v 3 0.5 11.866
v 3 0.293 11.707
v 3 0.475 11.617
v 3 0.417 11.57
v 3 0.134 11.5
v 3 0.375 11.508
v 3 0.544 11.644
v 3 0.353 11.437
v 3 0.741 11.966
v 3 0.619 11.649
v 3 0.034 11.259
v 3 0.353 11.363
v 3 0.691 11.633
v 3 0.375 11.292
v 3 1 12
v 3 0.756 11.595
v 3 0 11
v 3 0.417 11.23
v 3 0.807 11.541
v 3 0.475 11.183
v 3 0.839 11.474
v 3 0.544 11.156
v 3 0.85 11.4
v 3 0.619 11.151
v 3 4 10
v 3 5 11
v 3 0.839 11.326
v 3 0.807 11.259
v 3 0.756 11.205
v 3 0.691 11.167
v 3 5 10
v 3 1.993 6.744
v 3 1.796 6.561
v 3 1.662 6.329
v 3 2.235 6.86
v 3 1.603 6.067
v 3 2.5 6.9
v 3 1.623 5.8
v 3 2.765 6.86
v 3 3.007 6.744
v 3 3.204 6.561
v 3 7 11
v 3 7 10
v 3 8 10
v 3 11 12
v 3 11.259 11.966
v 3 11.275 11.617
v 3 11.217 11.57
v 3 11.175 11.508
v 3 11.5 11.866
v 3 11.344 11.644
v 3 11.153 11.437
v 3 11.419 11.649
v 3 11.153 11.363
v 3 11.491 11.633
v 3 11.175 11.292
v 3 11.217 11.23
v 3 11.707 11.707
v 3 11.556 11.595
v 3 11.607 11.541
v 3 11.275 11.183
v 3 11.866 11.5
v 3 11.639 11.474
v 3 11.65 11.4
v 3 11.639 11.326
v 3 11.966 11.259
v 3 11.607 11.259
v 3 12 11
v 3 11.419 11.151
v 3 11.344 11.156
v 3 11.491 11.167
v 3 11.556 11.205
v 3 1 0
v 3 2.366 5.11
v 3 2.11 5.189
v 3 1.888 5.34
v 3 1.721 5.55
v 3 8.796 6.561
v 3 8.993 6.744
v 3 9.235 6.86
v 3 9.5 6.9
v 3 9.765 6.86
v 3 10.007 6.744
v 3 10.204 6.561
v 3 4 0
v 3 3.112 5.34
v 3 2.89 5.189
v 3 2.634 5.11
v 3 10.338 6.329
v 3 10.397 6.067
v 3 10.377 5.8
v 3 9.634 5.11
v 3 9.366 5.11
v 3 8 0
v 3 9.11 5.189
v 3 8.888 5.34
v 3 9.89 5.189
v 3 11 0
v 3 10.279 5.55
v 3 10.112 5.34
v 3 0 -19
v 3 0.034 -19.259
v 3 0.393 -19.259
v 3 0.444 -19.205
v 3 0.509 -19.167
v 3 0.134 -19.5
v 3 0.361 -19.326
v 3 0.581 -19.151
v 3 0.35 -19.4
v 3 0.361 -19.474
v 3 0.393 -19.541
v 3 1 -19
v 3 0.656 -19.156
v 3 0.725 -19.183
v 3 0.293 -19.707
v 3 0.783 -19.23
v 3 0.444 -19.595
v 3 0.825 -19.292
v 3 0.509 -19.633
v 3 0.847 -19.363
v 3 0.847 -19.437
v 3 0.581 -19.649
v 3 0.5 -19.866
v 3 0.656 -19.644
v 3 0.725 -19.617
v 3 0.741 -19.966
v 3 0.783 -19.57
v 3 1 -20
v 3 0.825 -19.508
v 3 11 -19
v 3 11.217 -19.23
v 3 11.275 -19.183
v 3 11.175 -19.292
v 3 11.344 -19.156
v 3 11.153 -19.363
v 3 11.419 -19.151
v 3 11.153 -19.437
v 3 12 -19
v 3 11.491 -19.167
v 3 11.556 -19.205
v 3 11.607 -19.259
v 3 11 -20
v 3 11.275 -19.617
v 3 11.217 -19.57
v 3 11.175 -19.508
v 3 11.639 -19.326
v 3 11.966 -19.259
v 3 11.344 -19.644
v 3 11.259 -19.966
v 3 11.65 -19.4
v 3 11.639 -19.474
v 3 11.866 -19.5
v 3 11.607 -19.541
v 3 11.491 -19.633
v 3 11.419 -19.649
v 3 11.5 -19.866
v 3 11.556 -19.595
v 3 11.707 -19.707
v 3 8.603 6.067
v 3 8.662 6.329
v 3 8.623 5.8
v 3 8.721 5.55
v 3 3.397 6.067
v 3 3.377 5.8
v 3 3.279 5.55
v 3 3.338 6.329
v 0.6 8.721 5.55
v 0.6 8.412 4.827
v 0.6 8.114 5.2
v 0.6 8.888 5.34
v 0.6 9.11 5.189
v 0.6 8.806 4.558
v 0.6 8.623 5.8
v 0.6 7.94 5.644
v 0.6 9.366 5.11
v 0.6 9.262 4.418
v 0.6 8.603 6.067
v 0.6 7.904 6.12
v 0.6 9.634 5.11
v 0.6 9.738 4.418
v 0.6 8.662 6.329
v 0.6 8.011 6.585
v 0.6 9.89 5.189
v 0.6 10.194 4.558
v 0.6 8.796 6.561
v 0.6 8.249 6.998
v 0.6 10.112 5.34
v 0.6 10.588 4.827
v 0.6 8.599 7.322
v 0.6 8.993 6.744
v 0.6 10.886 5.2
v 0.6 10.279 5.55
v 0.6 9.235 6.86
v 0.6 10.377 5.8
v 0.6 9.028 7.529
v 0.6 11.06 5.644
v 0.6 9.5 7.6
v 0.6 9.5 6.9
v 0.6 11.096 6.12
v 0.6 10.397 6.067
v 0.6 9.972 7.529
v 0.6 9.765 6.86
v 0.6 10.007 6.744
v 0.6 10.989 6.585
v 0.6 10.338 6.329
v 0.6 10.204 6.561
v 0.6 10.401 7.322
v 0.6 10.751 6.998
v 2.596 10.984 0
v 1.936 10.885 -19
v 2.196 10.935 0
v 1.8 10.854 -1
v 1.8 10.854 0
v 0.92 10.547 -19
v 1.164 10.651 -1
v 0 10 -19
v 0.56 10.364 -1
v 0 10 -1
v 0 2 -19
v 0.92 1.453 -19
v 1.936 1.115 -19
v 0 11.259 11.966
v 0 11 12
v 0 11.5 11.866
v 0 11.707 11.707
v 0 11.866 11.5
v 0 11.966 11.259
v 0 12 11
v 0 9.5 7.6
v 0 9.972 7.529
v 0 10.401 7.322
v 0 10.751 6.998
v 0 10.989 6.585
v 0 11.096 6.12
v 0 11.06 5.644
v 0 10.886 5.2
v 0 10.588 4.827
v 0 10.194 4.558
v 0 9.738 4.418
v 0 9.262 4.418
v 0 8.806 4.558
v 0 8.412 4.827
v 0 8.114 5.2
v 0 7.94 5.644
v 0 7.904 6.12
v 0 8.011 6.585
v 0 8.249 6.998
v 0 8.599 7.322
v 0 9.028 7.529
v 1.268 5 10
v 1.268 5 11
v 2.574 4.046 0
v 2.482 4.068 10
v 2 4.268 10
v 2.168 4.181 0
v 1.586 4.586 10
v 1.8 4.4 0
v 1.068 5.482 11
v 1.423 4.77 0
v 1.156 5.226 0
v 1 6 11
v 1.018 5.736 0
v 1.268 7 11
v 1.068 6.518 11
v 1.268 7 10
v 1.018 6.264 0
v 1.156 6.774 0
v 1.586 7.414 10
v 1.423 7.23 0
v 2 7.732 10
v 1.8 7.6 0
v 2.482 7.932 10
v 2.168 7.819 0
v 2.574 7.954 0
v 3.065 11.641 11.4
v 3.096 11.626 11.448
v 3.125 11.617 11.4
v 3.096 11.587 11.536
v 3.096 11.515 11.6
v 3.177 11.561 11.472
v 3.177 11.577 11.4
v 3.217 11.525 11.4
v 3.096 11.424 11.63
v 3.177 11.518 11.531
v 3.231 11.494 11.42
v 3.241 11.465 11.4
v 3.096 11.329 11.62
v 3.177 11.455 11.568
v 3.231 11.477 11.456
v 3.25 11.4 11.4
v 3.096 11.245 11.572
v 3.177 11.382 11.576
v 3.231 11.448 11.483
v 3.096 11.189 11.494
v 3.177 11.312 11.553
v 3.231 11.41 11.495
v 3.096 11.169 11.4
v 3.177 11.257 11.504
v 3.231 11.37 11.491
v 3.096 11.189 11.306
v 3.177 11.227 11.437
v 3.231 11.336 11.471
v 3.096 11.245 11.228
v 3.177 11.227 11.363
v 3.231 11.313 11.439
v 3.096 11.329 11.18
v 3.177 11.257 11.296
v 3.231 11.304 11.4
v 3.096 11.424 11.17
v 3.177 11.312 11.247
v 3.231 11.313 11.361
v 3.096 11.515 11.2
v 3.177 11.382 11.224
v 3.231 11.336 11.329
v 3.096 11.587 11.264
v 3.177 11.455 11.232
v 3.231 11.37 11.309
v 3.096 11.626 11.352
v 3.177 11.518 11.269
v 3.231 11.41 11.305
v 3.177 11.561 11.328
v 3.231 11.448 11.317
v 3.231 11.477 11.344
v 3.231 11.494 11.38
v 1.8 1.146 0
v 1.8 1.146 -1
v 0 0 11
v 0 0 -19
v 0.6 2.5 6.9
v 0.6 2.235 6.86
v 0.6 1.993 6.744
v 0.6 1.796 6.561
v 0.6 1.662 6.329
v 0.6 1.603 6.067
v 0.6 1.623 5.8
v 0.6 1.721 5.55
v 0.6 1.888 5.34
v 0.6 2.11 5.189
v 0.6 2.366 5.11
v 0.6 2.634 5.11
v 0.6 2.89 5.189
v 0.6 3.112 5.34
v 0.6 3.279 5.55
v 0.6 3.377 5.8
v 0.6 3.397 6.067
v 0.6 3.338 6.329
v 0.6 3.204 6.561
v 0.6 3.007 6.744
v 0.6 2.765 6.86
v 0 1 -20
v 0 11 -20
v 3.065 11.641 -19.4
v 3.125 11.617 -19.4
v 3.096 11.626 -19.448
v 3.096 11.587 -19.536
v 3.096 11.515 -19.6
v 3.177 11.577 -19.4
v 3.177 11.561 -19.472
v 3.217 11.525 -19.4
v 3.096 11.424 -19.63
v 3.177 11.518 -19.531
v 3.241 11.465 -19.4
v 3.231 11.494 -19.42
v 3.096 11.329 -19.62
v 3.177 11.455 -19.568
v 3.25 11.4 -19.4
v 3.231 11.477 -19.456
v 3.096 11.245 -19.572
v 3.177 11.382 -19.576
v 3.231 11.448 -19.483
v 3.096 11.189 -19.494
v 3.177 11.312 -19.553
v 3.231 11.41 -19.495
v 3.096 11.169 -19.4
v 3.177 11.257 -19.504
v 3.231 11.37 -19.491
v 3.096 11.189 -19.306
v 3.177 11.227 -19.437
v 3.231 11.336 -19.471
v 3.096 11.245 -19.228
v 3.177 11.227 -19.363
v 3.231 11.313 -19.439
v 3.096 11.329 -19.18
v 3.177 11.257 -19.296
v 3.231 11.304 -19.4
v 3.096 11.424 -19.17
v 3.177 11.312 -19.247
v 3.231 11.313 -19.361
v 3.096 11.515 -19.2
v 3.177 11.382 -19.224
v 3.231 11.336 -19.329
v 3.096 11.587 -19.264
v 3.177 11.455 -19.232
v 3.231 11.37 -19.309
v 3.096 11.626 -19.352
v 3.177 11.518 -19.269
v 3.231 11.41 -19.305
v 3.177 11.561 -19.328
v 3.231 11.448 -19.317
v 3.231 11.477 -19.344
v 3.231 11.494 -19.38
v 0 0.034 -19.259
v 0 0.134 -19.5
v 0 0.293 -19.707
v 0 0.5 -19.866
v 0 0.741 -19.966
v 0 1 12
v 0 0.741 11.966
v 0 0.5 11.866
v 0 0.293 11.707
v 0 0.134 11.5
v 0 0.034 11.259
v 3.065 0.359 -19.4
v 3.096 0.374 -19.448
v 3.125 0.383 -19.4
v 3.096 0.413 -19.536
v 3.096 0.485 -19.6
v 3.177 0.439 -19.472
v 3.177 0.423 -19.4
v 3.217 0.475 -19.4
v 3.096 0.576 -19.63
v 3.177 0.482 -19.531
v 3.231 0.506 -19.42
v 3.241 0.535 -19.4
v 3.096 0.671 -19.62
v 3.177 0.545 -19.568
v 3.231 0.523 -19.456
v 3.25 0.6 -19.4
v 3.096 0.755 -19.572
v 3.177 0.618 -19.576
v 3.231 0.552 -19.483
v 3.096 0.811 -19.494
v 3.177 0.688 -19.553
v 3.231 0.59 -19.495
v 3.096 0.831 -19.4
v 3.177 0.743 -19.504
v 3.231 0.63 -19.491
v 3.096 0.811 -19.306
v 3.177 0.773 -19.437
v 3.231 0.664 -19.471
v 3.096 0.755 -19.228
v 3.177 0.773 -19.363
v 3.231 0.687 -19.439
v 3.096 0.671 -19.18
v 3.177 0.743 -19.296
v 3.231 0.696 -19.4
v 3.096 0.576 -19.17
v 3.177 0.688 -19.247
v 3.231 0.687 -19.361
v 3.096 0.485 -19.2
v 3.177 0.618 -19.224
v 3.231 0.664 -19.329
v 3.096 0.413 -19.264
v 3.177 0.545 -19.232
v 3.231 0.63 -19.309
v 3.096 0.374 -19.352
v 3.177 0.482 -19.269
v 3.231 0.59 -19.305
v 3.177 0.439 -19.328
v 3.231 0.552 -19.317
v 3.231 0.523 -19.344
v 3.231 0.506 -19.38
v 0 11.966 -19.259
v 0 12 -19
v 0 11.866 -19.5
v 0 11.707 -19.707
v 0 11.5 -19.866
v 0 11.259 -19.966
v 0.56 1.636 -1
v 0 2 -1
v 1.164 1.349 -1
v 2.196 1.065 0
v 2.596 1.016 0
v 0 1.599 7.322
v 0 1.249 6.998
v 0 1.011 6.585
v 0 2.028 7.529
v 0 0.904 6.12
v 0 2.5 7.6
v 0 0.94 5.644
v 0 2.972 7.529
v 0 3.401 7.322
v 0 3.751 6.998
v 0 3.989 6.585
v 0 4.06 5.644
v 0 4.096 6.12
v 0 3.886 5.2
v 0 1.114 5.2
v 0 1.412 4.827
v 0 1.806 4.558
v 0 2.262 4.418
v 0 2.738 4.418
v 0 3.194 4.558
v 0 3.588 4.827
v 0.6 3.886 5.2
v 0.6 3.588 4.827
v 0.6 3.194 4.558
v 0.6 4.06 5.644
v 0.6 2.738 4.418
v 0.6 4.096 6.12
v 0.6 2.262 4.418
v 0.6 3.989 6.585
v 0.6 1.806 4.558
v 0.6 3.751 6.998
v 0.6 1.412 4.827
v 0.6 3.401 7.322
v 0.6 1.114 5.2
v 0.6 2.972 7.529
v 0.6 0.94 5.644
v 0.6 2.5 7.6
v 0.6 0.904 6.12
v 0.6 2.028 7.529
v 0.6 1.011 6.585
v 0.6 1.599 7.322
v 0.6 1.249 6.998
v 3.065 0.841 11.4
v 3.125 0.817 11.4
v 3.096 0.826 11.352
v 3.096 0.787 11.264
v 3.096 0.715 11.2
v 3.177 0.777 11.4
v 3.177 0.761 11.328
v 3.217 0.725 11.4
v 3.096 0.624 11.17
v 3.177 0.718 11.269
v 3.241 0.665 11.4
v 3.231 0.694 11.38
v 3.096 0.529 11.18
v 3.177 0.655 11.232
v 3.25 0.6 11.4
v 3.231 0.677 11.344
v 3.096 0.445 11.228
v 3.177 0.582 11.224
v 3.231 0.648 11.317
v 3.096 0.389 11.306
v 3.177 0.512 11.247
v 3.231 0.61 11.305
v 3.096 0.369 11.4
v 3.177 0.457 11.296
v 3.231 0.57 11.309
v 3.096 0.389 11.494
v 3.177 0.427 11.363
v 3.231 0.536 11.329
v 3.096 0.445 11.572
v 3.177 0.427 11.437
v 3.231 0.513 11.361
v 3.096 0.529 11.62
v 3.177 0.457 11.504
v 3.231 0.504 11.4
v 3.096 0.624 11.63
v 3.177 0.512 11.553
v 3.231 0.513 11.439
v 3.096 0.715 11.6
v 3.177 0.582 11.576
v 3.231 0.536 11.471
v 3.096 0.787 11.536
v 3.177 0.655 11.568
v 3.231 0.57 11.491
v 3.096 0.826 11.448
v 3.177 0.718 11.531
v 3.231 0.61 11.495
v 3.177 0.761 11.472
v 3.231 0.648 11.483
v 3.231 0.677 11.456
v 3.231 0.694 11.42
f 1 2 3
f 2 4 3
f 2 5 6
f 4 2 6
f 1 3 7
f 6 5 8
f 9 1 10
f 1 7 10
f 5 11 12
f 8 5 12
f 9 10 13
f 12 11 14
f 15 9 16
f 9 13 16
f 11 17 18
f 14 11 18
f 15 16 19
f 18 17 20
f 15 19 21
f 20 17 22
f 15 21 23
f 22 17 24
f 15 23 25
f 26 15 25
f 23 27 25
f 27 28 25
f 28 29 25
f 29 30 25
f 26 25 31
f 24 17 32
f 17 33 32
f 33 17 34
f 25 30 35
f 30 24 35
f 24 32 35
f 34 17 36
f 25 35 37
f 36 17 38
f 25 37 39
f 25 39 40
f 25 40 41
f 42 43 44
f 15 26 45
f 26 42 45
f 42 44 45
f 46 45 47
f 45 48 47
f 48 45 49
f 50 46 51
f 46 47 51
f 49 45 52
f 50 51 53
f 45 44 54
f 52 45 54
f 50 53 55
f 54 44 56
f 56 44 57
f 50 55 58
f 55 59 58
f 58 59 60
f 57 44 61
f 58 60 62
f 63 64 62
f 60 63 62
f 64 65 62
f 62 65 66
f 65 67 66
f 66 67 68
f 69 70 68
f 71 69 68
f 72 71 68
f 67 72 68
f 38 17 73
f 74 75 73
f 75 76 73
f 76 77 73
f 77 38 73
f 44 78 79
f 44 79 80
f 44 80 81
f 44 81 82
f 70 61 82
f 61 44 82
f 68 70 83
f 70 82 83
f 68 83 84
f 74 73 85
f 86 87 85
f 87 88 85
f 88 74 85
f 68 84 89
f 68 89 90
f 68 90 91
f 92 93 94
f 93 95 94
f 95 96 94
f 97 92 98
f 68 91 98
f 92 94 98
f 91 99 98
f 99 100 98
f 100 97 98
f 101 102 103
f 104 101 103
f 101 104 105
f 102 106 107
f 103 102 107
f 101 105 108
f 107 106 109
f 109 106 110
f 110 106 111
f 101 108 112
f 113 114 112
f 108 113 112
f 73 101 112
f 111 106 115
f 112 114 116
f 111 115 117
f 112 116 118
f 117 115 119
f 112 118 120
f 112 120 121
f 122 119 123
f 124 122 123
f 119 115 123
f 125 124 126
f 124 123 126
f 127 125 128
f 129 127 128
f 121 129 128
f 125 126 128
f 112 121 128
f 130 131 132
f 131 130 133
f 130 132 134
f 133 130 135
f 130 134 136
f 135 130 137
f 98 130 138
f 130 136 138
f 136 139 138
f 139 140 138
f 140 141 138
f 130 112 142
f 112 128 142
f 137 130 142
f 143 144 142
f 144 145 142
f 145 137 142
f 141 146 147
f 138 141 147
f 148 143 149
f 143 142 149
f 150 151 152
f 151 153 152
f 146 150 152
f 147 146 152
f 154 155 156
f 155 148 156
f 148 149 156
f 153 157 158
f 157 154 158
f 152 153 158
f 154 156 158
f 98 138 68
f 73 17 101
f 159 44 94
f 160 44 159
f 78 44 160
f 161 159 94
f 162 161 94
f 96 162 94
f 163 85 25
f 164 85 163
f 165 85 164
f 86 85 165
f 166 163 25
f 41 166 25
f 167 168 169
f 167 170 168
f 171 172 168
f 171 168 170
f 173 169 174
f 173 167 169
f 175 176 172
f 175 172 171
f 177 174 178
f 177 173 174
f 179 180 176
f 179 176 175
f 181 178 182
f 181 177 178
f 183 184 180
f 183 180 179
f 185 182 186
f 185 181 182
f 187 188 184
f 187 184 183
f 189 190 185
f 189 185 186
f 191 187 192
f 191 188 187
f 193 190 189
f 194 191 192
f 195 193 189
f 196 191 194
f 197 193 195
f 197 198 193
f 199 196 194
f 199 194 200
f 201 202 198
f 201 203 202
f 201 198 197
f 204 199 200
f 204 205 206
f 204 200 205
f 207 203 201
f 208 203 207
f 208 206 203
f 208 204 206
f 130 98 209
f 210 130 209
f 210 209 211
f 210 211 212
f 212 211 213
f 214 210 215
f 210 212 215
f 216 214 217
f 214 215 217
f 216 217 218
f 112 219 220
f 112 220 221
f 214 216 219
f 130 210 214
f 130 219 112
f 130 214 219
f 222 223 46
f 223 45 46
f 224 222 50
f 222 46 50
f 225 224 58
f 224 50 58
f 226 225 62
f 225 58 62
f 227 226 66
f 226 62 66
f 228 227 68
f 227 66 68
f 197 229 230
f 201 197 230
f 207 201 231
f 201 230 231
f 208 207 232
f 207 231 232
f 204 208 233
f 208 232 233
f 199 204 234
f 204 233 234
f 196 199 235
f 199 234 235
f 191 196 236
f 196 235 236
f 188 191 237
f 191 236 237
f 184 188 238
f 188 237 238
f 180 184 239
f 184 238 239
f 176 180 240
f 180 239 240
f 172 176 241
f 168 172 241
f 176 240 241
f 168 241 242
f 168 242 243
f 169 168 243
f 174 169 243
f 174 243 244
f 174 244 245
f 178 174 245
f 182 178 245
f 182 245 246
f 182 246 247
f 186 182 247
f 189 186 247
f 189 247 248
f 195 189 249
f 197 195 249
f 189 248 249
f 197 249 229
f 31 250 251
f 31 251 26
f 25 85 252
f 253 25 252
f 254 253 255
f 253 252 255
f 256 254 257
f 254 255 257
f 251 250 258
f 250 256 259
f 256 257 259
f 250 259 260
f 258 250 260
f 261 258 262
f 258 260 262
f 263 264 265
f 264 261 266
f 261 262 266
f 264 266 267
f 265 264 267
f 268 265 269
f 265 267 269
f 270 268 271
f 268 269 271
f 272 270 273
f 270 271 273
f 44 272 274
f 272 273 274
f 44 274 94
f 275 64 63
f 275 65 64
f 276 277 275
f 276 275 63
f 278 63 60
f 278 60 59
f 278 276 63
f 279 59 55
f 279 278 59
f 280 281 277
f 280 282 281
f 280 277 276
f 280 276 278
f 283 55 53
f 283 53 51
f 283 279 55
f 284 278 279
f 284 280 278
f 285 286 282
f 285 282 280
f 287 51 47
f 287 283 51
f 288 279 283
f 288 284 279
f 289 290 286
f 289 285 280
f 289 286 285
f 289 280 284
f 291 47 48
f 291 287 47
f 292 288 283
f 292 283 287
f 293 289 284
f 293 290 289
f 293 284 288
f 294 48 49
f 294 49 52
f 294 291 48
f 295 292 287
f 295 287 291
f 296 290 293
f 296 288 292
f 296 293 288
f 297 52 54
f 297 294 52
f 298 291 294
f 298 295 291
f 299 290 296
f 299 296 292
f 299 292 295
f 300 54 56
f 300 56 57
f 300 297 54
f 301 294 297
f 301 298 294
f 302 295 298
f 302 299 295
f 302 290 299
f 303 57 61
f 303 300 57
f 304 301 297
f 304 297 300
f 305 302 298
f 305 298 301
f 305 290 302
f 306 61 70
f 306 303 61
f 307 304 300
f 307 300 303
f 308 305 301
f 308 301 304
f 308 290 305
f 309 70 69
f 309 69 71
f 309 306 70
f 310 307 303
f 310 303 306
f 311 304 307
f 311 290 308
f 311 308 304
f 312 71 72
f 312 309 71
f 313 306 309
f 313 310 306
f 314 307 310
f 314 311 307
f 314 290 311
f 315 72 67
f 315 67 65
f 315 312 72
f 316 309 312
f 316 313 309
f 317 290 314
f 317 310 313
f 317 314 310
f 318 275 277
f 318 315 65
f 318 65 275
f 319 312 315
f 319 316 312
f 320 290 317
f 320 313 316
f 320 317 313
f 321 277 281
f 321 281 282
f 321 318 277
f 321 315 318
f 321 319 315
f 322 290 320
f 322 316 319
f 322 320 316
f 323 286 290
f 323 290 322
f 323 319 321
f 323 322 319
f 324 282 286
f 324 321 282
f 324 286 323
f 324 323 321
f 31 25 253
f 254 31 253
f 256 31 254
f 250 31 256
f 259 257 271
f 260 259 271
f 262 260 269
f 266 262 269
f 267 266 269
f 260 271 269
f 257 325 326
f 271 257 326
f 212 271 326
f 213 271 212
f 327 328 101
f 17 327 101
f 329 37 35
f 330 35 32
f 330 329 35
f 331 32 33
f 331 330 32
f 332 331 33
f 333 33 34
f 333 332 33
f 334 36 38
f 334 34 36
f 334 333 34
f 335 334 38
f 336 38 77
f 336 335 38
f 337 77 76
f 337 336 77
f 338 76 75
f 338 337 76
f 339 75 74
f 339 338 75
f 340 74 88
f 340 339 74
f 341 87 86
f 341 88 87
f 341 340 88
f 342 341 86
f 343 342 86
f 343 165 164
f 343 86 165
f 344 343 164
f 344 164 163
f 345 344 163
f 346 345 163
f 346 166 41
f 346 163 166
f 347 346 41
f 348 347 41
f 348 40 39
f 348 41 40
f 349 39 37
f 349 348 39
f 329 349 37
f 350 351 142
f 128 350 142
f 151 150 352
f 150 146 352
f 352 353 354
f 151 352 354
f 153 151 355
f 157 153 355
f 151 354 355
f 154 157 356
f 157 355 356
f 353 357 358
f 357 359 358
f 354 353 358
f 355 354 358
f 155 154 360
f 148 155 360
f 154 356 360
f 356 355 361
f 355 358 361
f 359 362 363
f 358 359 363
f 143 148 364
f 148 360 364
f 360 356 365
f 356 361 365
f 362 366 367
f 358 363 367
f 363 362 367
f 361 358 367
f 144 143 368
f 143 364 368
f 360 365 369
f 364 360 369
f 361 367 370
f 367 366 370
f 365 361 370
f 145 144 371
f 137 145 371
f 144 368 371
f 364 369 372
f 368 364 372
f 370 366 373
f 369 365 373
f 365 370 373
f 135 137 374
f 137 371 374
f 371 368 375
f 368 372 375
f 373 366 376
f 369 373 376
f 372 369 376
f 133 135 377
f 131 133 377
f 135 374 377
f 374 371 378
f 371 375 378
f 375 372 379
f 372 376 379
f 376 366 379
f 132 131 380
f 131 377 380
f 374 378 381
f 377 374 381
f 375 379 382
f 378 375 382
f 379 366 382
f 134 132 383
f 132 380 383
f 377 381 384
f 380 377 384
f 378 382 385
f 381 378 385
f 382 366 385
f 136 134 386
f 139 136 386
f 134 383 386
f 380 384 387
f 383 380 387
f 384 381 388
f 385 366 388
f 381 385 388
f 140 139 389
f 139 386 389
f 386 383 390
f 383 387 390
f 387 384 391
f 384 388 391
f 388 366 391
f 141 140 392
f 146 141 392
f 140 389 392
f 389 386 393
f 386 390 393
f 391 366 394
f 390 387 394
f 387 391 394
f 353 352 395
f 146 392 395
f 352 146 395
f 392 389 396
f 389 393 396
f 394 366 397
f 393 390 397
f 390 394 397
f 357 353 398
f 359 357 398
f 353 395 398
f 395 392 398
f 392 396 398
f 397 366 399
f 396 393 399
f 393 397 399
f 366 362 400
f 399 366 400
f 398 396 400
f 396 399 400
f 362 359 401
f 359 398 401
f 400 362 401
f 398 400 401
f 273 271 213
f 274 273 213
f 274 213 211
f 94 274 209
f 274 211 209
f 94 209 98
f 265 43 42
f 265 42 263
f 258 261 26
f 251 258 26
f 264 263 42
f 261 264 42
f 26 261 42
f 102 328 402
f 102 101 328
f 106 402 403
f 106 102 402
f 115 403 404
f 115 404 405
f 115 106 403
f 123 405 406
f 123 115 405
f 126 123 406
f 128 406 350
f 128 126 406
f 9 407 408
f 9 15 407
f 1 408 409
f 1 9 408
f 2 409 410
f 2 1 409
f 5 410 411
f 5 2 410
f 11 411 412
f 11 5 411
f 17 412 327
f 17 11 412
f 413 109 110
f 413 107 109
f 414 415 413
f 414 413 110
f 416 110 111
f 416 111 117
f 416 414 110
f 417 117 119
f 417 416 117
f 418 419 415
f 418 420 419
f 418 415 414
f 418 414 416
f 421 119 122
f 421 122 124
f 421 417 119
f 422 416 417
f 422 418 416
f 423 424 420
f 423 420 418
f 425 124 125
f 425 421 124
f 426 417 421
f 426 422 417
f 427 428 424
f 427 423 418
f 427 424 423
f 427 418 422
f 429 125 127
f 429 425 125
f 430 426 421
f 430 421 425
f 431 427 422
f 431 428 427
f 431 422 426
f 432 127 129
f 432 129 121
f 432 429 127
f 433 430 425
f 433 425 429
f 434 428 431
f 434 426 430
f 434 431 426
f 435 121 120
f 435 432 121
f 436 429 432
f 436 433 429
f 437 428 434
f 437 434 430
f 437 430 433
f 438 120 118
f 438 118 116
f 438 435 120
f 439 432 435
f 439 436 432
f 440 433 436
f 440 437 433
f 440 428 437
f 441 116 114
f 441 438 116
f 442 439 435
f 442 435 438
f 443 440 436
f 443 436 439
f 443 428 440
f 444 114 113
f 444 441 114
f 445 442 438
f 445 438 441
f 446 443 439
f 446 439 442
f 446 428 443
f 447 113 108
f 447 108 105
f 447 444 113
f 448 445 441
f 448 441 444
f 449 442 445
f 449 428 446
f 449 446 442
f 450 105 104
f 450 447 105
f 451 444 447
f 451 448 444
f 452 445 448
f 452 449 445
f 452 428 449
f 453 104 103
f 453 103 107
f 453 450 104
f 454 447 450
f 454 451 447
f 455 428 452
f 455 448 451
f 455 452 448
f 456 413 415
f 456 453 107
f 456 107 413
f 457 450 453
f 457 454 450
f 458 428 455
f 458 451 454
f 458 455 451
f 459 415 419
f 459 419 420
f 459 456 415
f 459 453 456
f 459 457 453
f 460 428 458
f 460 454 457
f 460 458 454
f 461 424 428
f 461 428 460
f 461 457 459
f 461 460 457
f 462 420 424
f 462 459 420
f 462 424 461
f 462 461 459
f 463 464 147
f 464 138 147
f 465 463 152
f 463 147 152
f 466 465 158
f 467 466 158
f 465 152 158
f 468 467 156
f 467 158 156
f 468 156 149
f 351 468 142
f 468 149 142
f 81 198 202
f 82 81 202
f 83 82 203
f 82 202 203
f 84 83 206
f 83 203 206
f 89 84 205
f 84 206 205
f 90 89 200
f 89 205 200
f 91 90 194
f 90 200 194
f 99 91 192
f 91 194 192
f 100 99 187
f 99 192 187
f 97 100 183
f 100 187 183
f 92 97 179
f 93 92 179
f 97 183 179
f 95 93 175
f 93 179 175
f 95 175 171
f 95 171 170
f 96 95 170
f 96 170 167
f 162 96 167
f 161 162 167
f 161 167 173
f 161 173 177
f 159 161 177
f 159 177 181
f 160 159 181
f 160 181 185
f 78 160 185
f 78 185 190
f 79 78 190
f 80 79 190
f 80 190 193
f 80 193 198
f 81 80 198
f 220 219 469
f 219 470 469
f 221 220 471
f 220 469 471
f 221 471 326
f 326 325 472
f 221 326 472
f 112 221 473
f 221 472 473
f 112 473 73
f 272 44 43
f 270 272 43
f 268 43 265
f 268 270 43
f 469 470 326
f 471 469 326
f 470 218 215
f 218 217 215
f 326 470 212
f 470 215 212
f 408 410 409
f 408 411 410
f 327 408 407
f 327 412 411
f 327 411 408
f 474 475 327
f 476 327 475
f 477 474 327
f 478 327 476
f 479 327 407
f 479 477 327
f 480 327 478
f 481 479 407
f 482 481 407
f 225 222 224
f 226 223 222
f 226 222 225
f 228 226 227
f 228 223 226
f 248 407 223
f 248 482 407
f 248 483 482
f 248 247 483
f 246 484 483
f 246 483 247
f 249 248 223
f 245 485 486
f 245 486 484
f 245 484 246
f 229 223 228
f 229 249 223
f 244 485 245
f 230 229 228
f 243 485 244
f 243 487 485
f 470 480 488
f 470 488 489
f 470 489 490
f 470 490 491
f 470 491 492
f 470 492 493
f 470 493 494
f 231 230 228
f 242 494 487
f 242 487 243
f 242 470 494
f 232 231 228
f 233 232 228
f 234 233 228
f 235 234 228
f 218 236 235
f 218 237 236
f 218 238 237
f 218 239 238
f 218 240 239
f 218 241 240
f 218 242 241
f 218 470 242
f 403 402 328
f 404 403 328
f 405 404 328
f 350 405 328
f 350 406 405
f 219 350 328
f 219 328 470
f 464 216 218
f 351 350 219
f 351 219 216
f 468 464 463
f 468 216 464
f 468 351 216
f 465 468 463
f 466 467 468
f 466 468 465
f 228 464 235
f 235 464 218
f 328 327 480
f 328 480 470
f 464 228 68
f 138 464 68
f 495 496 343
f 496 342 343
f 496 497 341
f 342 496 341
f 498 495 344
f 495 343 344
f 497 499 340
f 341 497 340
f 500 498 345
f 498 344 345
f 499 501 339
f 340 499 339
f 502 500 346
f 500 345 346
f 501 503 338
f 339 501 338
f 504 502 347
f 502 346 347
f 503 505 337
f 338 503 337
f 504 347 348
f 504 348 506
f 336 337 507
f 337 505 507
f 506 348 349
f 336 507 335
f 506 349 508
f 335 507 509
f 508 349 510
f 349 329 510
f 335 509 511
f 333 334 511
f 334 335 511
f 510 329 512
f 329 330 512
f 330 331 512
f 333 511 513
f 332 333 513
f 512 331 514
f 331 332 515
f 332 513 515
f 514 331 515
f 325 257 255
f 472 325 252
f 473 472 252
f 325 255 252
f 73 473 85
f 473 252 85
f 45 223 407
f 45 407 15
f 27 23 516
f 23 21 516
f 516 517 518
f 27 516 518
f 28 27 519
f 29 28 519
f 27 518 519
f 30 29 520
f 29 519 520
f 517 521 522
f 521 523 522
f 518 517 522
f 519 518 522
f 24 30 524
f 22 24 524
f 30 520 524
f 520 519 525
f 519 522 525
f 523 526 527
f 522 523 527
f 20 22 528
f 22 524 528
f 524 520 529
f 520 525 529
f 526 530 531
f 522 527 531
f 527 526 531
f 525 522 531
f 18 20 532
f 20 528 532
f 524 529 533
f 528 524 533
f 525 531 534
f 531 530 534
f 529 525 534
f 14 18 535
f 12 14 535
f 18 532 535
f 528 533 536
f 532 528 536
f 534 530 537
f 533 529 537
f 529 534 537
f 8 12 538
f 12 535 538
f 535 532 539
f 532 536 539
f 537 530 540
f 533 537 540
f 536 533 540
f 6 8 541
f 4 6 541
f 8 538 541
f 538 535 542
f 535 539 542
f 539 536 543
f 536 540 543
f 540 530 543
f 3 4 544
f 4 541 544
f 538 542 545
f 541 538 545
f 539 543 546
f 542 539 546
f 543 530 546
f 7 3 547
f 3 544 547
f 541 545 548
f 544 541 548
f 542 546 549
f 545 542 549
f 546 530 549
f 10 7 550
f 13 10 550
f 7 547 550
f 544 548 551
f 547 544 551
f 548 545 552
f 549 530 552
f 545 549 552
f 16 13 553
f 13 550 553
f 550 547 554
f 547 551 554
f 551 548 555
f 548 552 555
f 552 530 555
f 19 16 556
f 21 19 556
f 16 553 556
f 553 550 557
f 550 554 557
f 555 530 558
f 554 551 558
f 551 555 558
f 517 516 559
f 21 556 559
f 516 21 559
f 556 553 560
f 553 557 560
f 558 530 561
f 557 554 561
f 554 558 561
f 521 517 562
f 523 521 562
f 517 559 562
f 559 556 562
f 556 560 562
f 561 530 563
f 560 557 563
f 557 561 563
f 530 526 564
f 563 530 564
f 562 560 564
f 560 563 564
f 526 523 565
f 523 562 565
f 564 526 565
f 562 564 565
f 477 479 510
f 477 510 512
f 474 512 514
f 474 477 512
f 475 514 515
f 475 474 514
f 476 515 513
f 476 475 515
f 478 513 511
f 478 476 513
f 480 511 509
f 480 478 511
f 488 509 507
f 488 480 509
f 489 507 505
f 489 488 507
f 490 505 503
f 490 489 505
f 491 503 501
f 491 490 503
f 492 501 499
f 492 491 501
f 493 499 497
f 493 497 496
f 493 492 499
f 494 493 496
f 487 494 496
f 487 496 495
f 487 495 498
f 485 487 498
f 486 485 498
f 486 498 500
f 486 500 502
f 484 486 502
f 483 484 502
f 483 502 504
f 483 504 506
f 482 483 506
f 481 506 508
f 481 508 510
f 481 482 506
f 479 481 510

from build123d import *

# Parameters (mm, degrees)
SKETCH1_W           = 3
SKETCH1_H           = 12
BOSS_EXTRUDE1_DEPTH = 20
SKETCH2_R           = 5
CUT_EXTRUDE1_DEPTH  = 19
SKETCH6_W           = 3
SKETCH6_H           = 12
BOSS_EXTRUDE3_DEPTH = 12
SKETCH13_W          = 1.8
SKETCH13_H          = 12
BOSS_EXTRUDE4_DEPTH = 1
SKETCH7_R           = 2
CUT_EXTRUDE2_DEPTH  = 10
CUT_EXTRUDE3_DEPTH  = 1
SKETCH11_R          = 1.6
CUT_EXTRUDE4_DEPTH  = 0.6
SKETCH12_R          = 0.9
CUT_EXTRUDE5_DEPTH  = 24.446961424
FILLET2_R           = 1


with BuildPart() as part:
    # Sketch1 → Boss-Extrude1 (new body)
    with BuildSketch(Plane.XY):
        with Locations((1.5, 6)):
            Rectangle(SKETCH1_W, SKETCH1_H)
    extrude(amount=-BOSS_EXTRUDE1_DEPTH)

    # Sketch2 → Cut-Extrude1 (cut)
    with BuildSketch(Plane.XY):
        with Locations((3, 6)):
            Circle(SKETCH2_R)
    extrude(amount=-CUT_EXTRUDE1_DEPTH, mode=Mode.SUBTRACT)

    # Sketch6 → Boss-Extrude3 (add)
    with BuildSketch(Plane.XY):
        with Locations((1.5, 6)):
            Rectangle(SKETCH6_W, SKETCH6_H)
    extrude(amount=BOSS_EXTRUDE3_DEPTH)

    # Sketch13 → Boss-Extrude4 (add)
    with BuildSketch(Plane.XY):
        with Locations((0.9, 6)):
            Rectangle(SKETCH13_W, SKETCH13_H)
    extrude(amount=-BOSS_EXTRUDE4_DEPTH)

    # Sketch7 → Cut-Extrude2 (cut)
    with BuildSketch(Plane(origin=(0, 0, 0), x_dir=(-1, 0, 0), z_dir=(0, 0, -1))):
        with Locations((-3, 6)):
            Circle(SKETCH7_R)
    extrude(amount=-CUT_EXTRUDE2_DEPTH, mode=Mode.SUBTRACT)

    # Sketch10 → Cut-Extrude3 (cut)
    with BuildSketch(Plane(origin=(0, 0, 10), x_dir=(-1, 0, 0), z_dir=(0, 0, -1))):
        with BuildLine():
            Line((-3, 7), (-1.267949192, 7))
            ThreePointArc((-1.267949192, 7), (-1, 6), (-1.267949192, 5))
            Line((-1.267949192, 5), (-3, 5))
            Line((-3, 5), (-3, 7))
        make_face()
    extrude(amount=-CUT_EXTRUDE3_DEPTH, mode=Mode.SUBTRACT)

    # Sketch11 → Cut-Extrude4 (cut)
    with BuildSketch(Plane.ZY):
        with Locations((6, 9.5)):
            Circle(SKETCH11_R)
    cut_extrude4 = extrude(amount=-CUT_EXTRUDE4_DEPTH, mode=Mode.SUBTRACT)

    # Sketch12 → Cut-Extrude5 (cut, through all)
    with BuildSketch(Plane.ZY.offset(-0.6)):
        with Locations((6, 9.5)):
            Circle(SKETCH12_R)
    cut_extrude5 = extrude(amount=-CUT_EXTRUDE5_DEPTH, mode=Mode.SUBTRACT)

    # Mirror1: Cut-Extrude4, Cut-Extrude5 across plane
    add(cut_extrude4.mirror(Plane(origin=(0, 6, 0), x_dir=(0, 0, 1), z_dir=(0, -1, 0))), mode=Mode.SUBTRACT)
    add(cut_extrude5.mirror(Plane(origin=(0, 6, 0), x_dir=(0, 0, 1), z_dir=(0, -1, 0))), mode=Mode.SUBTRACT)

    # Fillet2
    fillet2_edges = [part.edges().sort_by_distance(p)[0] for p in [
        (1.5, 0, 12),
        (1.5, 12, 12),
        (1.5, 0, -20),
        (1.5, 12, -20),
    ]]
    fillet(fillet2_edges, radius=FILLET2_R)

    # Sketch16 → Revolve3 (revolve)
    with BuildSketch(Plane(origin=(0, 0, -19.4), x_dir=(-1, 0, 0), z_dir=(0, 0, -1))):
        with BuildLine():
            Line((-3.25, 11.4), (-3, 11.4))
            Line((-3, 11.4), (-3, 11.15))
            ThreePointArc((-3, 11.15), (-3.176776695, 11.223223305), (-3.25, 11.4))
        make_face()
    revolve3 = revolve(axis=Axis((3.25, 11.4, -19.4), (-1, 0, 0)))

    # Mirror2: Revolve3 across plane
    add(revolve3.mirror(Plane(origin=(0, 6, 0), x_dir=(0, 0, 1), z_dir=(0, -1, 0))))

    # Mirror2 at the second plane: Revolve3 across plane
    add(revolve3.mirror(Plane.XY.offset(-4)))

    # Mirror2 at the second plane copy 1 sketc → Mirror2 at the second plane copy 1 (revolve)
    with BuildSketch(Plane(origin=(0, 12, 11.4), x_dir=(-1, 0, 0), z_dir=(0, 0, 1))):
        with BuildLine():
            Line((-3.25, 11.4), (-3, 11.4))
            Line((-3, 11.4), (-3, 11.15))
            ThreePointArc((-3, 11.15), (-3.176776695, 11.223223305), (-3.25, 11.4))
        make_face()
    revolve(axis=Axis((3.25, 0.6, 11.4), (-1, 0, 0)))


solid = part.part
